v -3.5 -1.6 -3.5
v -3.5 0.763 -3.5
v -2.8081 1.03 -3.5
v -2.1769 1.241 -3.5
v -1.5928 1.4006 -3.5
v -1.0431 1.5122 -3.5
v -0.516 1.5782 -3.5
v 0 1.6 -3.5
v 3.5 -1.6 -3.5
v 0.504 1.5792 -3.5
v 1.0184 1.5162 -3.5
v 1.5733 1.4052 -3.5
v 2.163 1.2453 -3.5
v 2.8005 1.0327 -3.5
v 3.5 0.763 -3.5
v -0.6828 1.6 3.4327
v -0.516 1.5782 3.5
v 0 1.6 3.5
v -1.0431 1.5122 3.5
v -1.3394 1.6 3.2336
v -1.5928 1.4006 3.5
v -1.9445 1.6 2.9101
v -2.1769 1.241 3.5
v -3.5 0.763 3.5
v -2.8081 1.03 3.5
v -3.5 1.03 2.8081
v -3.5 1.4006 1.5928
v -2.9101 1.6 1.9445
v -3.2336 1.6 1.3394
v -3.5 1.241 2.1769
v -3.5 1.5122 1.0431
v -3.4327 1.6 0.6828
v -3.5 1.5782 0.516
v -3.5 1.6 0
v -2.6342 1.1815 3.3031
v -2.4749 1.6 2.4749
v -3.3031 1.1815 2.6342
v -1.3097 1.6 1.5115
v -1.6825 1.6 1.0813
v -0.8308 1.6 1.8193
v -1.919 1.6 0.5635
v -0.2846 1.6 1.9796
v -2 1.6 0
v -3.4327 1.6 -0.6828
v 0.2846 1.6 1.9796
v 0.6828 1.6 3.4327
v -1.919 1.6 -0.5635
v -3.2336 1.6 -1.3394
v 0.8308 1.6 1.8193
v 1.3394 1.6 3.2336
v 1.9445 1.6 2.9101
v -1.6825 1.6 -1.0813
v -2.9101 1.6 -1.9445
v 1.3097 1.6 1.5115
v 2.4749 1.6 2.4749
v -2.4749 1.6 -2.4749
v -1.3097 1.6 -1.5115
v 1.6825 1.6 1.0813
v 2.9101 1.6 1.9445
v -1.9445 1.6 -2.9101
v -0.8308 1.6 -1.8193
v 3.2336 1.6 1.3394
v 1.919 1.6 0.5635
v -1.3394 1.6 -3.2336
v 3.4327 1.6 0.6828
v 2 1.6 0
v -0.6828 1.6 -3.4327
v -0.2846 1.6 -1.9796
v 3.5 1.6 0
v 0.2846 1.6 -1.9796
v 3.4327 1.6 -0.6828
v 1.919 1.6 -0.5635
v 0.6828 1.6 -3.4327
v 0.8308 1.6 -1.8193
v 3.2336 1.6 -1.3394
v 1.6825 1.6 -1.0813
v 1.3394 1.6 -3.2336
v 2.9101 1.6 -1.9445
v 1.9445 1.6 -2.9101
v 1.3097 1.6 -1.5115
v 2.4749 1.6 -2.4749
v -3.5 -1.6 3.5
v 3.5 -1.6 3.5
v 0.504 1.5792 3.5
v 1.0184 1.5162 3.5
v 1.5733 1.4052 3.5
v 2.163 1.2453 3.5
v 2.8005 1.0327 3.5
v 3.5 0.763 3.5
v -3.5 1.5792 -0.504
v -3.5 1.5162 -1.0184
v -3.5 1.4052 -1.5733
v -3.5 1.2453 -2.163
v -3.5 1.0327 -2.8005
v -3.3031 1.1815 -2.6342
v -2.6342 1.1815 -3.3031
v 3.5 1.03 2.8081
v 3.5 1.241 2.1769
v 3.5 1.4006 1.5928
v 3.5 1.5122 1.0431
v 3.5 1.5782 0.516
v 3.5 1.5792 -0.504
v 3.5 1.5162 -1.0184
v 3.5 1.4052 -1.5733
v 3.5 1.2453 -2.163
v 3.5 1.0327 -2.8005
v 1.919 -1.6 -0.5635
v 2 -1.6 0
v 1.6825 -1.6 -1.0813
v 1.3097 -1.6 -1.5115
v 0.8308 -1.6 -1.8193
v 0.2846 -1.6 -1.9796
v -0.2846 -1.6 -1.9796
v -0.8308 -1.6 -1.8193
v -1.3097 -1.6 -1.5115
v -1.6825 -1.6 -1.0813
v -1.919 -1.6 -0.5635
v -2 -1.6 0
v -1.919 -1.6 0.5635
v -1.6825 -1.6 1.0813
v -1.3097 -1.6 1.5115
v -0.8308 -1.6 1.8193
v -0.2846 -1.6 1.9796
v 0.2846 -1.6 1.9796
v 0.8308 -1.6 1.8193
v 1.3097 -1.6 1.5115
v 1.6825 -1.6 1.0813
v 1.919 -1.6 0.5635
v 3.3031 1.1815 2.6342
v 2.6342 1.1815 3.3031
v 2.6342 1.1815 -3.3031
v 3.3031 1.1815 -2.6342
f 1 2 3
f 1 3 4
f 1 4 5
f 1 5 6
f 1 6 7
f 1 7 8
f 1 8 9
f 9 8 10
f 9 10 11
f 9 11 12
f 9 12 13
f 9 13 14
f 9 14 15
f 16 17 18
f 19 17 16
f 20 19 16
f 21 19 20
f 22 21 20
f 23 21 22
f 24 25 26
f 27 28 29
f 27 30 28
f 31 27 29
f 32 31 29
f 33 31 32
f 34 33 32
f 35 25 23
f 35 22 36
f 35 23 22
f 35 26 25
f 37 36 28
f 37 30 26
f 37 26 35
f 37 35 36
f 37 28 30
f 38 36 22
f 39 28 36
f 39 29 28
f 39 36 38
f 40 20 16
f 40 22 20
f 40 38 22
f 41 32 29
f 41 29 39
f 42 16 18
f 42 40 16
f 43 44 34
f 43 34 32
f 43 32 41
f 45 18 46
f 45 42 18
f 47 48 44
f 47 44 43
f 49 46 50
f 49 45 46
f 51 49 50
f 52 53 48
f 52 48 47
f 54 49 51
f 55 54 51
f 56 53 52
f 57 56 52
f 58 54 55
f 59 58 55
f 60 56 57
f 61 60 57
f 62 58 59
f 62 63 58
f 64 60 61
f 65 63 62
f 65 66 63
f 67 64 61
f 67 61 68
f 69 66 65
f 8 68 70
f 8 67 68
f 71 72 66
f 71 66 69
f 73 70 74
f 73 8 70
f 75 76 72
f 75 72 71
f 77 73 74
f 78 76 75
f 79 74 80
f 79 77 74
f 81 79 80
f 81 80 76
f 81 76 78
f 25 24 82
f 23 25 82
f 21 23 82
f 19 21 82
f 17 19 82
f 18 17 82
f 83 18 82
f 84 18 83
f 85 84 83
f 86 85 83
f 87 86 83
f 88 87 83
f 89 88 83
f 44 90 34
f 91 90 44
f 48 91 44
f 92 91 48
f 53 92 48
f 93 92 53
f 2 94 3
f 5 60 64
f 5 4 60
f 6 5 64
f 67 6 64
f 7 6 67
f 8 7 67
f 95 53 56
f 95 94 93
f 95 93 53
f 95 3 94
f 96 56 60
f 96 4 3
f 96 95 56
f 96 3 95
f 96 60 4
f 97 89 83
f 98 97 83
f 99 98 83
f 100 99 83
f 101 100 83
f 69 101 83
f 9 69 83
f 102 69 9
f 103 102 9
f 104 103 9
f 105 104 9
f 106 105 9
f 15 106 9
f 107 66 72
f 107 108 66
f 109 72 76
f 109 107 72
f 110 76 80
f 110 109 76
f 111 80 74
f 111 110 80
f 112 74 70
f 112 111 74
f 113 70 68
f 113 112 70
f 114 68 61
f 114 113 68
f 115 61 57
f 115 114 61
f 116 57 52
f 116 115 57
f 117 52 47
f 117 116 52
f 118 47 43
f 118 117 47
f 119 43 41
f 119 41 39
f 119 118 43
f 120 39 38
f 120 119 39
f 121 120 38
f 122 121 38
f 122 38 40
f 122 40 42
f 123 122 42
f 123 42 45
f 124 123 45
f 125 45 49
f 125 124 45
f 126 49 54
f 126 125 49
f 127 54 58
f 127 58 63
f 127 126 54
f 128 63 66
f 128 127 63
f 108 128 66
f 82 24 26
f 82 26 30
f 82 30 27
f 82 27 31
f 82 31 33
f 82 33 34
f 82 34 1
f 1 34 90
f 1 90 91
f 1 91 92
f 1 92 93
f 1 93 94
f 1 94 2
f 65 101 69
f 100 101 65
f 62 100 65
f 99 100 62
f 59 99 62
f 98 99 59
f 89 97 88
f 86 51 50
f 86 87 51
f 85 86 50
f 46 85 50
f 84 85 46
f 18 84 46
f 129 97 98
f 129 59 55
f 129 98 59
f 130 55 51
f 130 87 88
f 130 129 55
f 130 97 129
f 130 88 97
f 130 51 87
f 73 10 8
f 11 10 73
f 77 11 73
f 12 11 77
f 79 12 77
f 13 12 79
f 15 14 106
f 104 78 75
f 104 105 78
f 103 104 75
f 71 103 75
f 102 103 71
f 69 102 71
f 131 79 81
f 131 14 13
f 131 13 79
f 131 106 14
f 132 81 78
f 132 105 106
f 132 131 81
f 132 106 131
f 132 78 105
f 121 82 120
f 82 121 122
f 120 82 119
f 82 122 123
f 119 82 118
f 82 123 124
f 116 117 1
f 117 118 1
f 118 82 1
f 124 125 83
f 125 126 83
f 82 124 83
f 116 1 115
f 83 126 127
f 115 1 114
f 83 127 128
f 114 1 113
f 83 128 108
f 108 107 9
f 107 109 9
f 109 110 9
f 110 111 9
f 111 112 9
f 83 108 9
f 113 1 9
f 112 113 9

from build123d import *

# Parameters (mm, degrees)
SKETCH1_W           = 7
SKETCH1_H           = 7
SKETCH1_R           = 2
BOSS_EXTRUDE1_DEPTH = 1.6
SKETCH5_OUTSIDE_W   = 25.63
SKETCH5_OUTSIDE_H   = 25.63
SKETCH5_OUTSIDE_R   = 3.5
CUT_EXTRUDE2_DEPTH  = 4.2
CUT_EXTRUDE2_TAPER  = 60


with BuildPart() as part:
    # Sketch1 → Boss-Extrude1 (new body, symmetric)
    with BuildSketch(Plane(origin=(0, 0, 0), x_dir=(1, 0, 0), z_dir=(0, 1, 0))):
        Rectangle(SKETCH1_W, SKETCH1_H)
        Circle(SKETCH1_R, mode=Mode.SUBTRACT)
    extrude(amount=BOSS_EXTRUDE1_DEPTH, both=True)

    # Sketch5 outside → Cut-Extrude2 (cut, through all)
    with BuildSketch(Plane(origin=(0, 1.6, 0), x_dir=(1, 0, 0), z_dir=(0, 1, 0))):
        Rectangle(SKETCH5_OUTSIDE_W, SKETCH5_OUTSIDE_H)
        Circle(SKETCH5_OUTSIDE_R, mode=Mode.SUBTRACT)
    extrude(amount=-CUT_EXTRUDE2_DEPTH, taper=CUT_EXTRUDE2_TAPER, mode=Mode.SUBTRACT)


solid = part.part
